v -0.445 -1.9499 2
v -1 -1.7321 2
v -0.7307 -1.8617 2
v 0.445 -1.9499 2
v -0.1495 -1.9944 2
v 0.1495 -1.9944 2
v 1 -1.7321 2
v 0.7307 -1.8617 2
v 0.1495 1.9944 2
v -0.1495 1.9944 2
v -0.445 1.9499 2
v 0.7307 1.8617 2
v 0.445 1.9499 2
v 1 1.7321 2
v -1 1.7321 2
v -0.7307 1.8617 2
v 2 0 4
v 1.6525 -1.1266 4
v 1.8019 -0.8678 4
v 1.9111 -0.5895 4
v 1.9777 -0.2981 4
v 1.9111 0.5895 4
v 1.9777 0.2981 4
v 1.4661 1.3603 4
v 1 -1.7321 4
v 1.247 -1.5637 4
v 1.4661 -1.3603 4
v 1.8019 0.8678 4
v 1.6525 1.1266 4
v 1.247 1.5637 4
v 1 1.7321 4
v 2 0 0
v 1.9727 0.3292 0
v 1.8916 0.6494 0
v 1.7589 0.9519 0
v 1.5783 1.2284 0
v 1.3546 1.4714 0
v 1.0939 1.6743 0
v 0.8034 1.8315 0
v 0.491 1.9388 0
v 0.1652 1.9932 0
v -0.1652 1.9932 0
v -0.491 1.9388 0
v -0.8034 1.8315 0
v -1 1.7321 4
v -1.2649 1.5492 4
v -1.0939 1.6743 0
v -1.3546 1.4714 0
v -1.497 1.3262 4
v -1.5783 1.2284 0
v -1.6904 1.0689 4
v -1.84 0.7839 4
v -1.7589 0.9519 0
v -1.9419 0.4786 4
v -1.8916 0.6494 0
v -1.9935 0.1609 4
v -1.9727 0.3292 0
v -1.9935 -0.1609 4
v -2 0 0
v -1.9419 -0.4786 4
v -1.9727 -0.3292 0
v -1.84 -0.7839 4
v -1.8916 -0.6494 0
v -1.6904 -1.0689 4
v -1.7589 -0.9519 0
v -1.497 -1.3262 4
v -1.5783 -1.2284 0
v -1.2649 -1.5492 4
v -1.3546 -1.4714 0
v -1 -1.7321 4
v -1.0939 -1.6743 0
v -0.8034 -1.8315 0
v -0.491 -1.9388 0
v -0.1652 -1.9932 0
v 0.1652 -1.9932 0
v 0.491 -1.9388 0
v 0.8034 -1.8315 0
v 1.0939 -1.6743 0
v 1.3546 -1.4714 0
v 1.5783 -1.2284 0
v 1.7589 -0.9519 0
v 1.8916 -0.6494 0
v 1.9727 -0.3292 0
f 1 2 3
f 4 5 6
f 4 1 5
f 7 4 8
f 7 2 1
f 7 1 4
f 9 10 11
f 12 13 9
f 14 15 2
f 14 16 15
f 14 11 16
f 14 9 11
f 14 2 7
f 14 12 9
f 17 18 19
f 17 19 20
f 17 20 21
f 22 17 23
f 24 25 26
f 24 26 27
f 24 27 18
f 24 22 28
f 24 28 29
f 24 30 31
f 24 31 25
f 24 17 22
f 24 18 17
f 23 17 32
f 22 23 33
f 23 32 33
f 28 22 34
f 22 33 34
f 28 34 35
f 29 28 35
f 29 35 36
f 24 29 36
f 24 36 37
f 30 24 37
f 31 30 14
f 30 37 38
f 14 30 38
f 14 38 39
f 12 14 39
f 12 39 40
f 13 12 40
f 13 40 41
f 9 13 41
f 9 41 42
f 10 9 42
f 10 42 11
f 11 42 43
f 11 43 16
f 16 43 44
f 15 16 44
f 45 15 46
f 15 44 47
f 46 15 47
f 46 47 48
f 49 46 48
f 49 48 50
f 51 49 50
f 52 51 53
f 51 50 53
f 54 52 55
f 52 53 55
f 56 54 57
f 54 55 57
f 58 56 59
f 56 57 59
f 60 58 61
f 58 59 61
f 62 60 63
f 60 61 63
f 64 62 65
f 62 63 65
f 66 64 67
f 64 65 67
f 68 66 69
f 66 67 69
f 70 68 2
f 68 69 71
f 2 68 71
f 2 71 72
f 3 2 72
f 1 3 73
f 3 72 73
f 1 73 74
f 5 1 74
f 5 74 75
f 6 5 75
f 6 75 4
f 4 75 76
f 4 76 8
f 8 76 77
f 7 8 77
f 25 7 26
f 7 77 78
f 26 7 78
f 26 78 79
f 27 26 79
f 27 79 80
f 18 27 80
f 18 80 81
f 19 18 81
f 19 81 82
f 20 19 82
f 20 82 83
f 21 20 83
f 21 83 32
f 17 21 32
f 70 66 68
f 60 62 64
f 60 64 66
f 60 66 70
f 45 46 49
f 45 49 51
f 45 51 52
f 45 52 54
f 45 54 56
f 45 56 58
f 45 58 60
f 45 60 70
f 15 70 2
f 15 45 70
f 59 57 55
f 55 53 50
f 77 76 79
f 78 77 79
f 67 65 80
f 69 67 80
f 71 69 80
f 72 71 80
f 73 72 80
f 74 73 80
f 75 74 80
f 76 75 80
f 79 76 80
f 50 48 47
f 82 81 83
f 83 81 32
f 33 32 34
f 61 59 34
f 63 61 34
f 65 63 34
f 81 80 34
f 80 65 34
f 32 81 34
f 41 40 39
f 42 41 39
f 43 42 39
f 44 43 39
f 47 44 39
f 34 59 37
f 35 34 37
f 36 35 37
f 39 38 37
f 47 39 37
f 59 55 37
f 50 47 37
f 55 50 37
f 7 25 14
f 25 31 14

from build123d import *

# Parameters (mm, degrees)
SKETCH1_R           = 2
BOSS_EXTRUDE1_DEPTH = 4
SKETCH2_W           = 2
SKETCH2_H           = 4
CUT_EXTRUDE1_DEPTH  = 2


with BuildPart() as part:
    # Sketch1 → Boss-Extrude1 (new body)
    with BuildSketch(Plane.XY):
        Circle(SKETCH1_R)
    extrude(amount=BOSS_EXTRUDE1_DEPTH)

    # Sketch2 → Cut-Extrude1 (cut, symmetric)
    with BuildSketch(Plane(origin=(0, 0, 0), x_dir=(1, 0, 0), z_dir=(0, 1, 0))):
        with Locations((0, -4)):
            Rectangle(SKETCH2_W, SKETCH2_H)
    extrude(amount=CUT_EXTRUDE1_DEPTH, both=True, mode=Mode.SUBTRACT)


solid = part.part
